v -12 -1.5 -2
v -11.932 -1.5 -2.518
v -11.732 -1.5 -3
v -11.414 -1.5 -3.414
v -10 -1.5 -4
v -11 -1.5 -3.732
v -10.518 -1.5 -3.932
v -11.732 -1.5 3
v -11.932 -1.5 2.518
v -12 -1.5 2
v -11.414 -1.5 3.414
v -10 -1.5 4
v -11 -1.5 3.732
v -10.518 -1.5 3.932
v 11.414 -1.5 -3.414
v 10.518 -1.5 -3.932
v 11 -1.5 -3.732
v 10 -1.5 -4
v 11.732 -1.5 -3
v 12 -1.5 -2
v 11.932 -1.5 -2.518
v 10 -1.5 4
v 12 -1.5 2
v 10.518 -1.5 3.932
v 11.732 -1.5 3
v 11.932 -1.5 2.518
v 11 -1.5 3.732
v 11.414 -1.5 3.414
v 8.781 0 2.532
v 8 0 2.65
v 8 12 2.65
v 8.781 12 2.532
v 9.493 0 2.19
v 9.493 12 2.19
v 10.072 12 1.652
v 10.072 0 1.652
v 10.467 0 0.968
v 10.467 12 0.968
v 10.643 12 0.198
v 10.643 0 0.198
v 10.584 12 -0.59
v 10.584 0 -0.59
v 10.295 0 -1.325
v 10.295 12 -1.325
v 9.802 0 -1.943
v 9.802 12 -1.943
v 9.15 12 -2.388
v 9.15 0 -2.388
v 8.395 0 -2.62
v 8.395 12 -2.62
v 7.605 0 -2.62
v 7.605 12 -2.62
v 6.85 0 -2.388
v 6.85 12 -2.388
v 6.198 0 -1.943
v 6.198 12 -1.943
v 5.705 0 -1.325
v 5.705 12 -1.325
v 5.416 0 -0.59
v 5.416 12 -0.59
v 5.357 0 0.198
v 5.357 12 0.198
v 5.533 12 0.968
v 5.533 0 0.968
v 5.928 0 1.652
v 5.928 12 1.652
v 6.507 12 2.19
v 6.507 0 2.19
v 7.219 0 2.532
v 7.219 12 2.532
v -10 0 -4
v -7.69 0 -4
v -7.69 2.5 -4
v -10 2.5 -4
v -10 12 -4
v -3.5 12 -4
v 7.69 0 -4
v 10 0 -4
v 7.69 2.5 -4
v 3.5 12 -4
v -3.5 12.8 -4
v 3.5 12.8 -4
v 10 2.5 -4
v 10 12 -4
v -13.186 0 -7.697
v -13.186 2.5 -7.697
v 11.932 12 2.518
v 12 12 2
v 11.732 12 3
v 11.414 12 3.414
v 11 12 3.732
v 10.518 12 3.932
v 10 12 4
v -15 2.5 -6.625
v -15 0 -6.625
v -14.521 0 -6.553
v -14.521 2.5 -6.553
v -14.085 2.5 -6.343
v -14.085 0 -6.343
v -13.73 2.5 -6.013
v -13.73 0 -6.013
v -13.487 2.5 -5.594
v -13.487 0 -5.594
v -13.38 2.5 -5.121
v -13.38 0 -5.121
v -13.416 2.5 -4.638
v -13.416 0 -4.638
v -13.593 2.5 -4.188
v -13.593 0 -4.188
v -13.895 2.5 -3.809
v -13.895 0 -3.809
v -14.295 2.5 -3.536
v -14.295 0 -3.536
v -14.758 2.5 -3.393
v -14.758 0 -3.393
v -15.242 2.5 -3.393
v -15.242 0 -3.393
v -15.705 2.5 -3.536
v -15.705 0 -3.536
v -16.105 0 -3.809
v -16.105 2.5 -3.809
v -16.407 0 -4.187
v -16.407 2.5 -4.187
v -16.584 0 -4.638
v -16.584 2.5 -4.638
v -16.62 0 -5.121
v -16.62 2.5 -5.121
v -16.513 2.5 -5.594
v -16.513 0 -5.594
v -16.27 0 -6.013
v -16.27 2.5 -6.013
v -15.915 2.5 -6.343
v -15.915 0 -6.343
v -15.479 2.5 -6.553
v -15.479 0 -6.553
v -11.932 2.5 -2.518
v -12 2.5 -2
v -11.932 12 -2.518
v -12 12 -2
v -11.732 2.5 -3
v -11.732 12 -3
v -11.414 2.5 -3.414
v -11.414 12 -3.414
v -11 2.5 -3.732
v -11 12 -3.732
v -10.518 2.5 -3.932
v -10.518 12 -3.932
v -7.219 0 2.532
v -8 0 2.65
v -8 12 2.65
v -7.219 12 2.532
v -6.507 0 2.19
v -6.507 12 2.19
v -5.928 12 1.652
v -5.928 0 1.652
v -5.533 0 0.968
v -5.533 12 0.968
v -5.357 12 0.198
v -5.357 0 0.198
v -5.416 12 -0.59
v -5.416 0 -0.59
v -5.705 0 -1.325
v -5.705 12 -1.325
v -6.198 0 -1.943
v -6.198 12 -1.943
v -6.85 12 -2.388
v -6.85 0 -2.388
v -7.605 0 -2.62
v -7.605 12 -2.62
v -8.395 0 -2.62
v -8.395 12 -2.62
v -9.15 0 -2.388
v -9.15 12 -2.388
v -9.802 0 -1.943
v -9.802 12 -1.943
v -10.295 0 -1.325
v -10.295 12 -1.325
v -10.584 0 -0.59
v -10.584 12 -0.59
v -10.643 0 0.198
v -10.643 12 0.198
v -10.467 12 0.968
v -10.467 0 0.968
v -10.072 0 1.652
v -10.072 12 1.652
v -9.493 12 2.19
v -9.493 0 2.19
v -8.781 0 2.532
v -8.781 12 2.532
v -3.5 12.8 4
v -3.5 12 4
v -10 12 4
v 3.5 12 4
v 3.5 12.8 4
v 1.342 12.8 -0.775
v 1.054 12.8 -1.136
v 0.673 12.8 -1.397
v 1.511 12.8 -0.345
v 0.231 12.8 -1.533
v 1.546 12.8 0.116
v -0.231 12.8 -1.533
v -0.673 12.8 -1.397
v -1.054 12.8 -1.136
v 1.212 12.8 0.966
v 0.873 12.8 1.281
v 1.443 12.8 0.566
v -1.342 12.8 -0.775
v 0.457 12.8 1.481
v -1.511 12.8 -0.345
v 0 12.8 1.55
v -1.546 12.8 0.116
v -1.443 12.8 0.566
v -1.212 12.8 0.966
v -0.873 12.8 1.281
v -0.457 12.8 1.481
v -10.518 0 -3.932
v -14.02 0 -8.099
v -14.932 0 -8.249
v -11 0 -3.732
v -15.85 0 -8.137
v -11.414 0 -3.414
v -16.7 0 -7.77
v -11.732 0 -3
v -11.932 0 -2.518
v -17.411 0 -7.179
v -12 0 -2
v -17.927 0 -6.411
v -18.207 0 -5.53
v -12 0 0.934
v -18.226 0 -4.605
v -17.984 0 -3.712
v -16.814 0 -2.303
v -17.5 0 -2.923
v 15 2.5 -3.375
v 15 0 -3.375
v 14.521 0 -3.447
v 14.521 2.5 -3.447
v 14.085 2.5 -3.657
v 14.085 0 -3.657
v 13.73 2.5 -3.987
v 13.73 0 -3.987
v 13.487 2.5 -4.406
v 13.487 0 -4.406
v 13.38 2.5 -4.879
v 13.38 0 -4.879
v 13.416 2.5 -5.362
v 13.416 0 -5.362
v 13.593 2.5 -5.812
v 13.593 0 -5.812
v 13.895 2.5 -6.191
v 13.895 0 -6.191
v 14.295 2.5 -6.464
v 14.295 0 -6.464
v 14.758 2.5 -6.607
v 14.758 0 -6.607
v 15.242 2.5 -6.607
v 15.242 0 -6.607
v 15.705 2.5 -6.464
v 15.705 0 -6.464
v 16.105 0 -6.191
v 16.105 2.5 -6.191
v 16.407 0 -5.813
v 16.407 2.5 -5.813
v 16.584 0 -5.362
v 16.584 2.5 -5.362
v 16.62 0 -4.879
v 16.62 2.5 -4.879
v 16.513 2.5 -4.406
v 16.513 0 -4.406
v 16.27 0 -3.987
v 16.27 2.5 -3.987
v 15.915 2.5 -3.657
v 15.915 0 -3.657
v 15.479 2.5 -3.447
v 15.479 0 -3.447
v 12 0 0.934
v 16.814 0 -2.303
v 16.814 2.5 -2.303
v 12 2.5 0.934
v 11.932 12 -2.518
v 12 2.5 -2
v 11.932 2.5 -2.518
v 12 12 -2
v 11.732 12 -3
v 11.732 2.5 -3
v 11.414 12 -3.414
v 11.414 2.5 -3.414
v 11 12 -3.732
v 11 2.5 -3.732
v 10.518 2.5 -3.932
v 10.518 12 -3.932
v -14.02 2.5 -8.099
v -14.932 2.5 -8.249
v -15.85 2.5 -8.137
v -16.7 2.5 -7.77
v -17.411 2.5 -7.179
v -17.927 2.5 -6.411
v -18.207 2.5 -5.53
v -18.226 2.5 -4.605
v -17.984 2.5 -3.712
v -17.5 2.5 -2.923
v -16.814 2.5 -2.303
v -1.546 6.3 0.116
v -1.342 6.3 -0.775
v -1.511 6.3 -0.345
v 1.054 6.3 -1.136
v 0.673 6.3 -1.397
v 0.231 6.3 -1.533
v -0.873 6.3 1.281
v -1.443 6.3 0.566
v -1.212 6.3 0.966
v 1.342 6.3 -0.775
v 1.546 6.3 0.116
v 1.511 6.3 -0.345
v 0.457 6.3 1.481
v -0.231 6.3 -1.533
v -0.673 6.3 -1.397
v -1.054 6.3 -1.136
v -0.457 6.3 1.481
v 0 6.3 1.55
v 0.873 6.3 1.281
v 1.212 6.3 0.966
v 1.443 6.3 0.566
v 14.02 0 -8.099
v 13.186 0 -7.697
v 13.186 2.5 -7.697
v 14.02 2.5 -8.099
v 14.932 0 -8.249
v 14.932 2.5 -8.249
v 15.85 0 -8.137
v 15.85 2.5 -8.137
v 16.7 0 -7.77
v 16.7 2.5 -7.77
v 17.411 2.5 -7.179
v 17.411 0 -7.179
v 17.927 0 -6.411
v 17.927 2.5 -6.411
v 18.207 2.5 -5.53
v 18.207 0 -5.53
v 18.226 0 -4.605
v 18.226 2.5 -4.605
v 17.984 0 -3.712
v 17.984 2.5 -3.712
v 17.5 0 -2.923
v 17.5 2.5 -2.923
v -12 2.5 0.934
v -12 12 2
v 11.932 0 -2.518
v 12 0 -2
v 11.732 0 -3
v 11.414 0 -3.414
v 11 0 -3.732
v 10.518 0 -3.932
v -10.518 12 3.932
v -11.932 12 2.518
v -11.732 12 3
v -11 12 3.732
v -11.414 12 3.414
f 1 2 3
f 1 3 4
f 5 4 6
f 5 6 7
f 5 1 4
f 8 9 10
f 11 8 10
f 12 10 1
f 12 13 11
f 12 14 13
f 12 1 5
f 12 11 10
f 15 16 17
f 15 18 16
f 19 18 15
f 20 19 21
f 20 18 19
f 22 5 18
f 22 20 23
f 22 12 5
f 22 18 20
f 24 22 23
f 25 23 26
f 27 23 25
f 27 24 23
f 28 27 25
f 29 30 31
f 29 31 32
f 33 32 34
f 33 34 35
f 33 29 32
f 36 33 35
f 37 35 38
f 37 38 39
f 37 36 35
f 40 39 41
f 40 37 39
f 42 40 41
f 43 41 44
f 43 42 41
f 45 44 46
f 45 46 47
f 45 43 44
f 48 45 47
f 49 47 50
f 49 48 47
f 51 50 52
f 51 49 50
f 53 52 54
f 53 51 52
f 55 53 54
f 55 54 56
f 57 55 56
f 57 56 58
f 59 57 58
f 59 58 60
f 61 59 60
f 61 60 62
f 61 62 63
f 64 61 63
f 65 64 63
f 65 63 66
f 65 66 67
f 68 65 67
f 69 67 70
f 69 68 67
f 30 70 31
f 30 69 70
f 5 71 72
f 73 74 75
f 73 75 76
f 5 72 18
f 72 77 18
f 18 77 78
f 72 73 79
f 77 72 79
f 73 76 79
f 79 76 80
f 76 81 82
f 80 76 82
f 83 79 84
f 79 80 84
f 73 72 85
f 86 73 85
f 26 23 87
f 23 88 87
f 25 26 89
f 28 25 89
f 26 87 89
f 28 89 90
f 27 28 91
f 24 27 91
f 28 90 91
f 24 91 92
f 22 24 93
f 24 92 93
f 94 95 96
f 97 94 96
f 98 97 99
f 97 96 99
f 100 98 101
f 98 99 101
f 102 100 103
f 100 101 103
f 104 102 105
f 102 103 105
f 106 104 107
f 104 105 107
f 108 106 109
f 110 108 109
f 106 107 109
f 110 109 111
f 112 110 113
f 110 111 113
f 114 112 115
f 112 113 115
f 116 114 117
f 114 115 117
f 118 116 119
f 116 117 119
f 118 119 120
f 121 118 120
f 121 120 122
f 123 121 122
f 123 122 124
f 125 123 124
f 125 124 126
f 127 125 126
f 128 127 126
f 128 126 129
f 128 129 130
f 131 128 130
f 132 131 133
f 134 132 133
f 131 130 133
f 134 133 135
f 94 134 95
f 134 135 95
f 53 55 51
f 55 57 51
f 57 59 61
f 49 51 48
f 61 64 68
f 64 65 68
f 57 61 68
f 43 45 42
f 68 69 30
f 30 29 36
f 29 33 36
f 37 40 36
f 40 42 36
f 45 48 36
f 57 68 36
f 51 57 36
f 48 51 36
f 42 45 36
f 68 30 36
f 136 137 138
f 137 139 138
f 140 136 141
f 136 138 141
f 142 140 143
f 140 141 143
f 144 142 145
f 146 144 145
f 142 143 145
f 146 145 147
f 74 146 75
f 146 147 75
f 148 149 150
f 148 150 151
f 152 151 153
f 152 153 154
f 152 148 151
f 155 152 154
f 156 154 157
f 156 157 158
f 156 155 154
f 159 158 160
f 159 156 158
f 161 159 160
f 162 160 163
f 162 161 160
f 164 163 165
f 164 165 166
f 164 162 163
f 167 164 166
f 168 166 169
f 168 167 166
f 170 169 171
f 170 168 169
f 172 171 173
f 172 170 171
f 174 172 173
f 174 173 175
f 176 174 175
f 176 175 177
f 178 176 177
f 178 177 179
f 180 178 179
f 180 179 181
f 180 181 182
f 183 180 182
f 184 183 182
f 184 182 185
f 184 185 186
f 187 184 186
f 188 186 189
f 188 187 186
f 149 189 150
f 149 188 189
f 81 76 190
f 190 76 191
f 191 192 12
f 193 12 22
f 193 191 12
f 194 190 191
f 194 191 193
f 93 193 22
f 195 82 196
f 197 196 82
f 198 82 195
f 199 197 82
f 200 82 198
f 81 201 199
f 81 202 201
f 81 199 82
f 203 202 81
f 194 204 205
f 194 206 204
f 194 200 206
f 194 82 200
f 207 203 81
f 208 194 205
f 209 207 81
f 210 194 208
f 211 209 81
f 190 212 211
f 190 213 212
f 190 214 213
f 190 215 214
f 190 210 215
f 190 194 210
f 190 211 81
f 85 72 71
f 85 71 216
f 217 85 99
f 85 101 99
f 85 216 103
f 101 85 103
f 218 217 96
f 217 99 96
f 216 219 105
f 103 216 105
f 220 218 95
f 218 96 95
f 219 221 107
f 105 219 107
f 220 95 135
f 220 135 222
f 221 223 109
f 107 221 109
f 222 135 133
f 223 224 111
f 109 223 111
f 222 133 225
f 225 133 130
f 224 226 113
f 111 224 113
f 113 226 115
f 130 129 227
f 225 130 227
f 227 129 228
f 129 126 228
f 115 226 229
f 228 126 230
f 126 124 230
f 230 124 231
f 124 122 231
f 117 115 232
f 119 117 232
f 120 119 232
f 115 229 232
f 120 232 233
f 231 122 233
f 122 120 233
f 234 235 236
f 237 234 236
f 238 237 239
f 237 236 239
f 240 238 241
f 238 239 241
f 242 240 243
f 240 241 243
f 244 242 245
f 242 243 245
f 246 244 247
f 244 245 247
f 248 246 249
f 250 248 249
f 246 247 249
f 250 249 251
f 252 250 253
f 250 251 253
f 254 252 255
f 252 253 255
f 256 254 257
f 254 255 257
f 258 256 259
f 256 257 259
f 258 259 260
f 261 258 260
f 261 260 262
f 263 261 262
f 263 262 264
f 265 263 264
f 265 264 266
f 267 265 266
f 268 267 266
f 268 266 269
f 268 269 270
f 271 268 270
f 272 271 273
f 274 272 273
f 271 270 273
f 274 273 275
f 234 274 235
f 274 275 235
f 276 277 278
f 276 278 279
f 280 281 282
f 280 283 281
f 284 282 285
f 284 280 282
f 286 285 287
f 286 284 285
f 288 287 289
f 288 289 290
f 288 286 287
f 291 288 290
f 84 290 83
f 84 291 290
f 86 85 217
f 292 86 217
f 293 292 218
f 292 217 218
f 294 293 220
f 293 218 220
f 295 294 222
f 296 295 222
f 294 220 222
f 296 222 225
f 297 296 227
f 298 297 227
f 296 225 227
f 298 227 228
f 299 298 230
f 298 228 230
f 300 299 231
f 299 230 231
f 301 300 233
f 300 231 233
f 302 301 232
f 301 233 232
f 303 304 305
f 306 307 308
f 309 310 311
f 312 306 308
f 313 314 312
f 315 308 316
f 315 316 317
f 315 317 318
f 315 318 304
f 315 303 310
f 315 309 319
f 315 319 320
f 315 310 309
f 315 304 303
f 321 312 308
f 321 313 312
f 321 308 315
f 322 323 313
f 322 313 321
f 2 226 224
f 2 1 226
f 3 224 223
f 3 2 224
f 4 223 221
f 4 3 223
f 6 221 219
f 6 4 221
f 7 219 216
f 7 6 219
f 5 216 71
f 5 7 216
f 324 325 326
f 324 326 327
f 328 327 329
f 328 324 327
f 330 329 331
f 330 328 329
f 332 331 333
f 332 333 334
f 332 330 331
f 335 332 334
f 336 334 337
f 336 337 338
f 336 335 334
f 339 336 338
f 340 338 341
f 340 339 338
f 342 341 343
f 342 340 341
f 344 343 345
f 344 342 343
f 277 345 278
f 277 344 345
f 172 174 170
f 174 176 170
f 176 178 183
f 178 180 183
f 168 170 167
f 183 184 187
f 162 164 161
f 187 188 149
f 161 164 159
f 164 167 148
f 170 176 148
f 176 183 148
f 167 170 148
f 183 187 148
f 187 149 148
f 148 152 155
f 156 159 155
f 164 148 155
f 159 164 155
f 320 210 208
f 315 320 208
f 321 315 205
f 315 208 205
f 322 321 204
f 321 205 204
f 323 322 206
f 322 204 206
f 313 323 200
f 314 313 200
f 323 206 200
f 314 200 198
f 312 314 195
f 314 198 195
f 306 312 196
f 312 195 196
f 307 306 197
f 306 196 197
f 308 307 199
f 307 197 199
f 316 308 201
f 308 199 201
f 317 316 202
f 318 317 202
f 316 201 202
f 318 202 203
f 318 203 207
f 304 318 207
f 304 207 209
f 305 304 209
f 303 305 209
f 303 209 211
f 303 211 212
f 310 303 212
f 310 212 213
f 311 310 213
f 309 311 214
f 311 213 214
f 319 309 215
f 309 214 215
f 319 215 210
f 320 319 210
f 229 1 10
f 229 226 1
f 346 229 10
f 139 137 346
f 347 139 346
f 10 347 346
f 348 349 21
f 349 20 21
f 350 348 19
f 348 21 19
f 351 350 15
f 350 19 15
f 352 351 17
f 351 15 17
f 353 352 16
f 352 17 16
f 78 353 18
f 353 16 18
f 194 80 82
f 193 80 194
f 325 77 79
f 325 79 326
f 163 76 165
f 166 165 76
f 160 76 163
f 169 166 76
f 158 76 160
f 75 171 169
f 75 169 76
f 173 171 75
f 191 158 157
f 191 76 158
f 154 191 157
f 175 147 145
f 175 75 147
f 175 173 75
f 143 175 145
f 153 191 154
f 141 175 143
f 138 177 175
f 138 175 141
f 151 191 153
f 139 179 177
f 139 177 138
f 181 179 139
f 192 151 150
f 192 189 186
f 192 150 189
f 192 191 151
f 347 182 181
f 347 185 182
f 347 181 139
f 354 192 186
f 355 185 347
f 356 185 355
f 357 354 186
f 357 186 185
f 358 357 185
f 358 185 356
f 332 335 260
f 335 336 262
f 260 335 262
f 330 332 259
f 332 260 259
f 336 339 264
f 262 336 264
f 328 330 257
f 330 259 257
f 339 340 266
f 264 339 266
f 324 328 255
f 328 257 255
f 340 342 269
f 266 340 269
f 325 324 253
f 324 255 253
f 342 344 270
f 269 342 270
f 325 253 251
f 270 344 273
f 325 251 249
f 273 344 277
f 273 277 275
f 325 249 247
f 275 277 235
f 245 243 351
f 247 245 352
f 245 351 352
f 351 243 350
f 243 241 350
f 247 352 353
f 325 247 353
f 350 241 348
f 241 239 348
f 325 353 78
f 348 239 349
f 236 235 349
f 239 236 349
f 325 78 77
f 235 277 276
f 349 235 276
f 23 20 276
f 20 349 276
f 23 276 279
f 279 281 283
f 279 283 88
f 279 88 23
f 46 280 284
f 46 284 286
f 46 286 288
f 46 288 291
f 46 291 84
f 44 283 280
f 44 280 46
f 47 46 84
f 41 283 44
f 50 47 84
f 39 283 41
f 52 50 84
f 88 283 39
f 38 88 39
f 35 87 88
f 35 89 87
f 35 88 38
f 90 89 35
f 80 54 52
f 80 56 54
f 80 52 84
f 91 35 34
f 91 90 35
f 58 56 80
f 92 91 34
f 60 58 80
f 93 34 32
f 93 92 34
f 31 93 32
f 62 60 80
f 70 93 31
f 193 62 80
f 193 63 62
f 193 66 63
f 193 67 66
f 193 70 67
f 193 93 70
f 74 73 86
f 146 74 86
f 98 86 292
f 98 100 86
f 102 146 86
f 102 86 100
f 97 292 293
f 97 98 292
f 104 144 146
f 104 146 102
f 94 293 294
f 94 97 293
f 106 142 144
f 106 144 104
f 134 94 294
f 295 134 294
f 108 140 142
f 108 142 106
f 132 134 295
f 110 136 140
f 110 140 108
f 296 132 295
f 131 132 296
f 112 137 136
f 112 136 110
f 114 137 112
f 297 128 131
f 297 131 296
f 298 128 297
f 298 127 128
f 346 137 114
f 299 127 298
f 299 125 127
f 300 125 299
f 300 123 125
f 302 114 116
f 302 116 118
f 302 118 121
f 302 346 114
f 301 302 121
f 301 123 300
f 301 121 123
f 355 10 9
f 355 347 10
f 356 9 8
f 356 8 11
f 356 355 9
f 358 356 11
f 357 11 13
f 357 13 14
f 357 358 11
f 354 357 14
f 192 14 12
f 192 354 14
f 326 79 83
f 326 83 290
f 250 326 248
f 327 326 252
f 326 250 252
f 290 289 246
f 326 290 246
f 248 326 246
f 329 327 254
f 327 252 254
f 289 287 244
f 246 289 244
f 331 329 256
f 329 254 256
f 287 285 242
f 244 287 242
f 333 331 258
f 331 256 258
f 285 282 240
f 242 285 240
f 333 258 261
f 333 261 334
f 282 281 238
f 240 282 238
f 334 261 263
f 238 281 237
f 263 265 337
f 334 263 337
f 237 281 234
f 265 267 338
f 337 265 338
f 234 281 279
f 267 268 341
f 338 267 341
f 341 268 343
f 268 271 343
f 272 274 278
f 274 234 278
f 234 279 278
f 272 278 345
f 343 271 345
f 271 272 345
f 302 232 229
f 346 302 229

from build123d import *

# Parameters (mm, degrees)
SKETCH25_W          = 7
SKETCH25_H          = 8
BOSS_EXTRUDE5_DEPTH = 12.8
SKETCH26_W          = 24
SKETCH26_H          = 8
SKETCH26_R          = 2.65
BOSS_EXTRUDE6_DEPTH = 12
SKETCH27_R          = 1.55
CUT_EXTRUDE1_DEPTH  = 6.5
SKETCH29_R          = 1.625
BOSS_EXTRUDE8_DEPTH = 2.5
SKETCH31_W          = 24
SKETCH31_H          = 8
BOSS_EXTRUDE9_DEPTH = 1.5
FILLET1_R           = 2


with BuildPart() as part:
    # Sketch25 → Boss-Extrude5 (new body)
    with BuildSketch(Plane(origin=(0, 0, 0), x_dir=(-1, 0, 0), z_dir=(0, 1, 0))):
        Rectangle(SKETCH25_W, SKETCH25_H)
    extrude(amount=BOSS_EXTRUDE5_DEPTH)

    # Sketch26 → Boss-Extrude6 (add)
    with BuildSketch(Plane(origin=(0, 0, 0), x_dir=(-1, 0, 0), z_dir=(0, 1, 0))):
        Rectangle(SKETCH26_W, SKETCH26_H)
        with Locations((-8, 0)):
            Circle(SKETCH26_R, mode=Mode.SUBTRACT)
        with Locations((8, 0)):
            Circle(SKETCH26_R, mode=Mode.SUBTRACT)
    extrude(amount=BOSS_EXTRUDE6_DEPTH)

    # Sketch27 → Cut-Extrude1 (cut)
    with BuildSketch(Plane(origin=(0, 12.8, 0), x_dir=(1, 0, 0), z_dir=(0, 1, 0))):
        Circle(SKETCH27_R)
    extrude(amount=-CUT_EXTRUDE1_DEPTH, mode=Mode.SUBTRACT)

    # Sketch29 → Boss-Extrude8 (add)
    # profile 1 of 2: a face of its own
    with BuildSketch(Plane.XZ):
        with BuildLine():
            Line((-16.813742475, -2.303179977), (-12, 0.934295686))
            Line((-12, 0.934295686), (-12, -4))
            Line((-12, -4), (-7.689524447, -4))
            Line((-7.689524447, -4), (-13.186257525, -7.696820023))
            ThreePointArc((-13.186257525, -7.696820023), (-17.696820023, -6.813742475), (-16.813742475, -2.303179977))
        make_face()
        with Locations((-15, -5)):
            Circle(SKETCH29_R, mode=Mode.SUBTRACT)
    # profile 2 of 2: a face of its own
    with BuildSketch(Plane.XZ):
        with BuildLine():
            Line((16.813742475, -2.303179977), (12, 0.934295686))
            Line((12, 0.934295686), (12, -4))
            Line((12, -4), (7.689524447, -4))
            Line((7.689524447, -4), (13.186257525, -7.696820023))
            ThreePointArc((13.186257525, -7.696820023), (17.696820023, -6.813742475), (16.813742475, -2.303179977))
        make_face()
        with Locations((15, -5)):
            Circle(SKETCH29_R, mode=Mode.SUBTRACT)
    extrude(amount=-BOSS_EXTRUDE8_DEPTH)

    # Sketch31 → Boss-Extrude9 (add)
    with BuildSketch(Plane.XZ):
        Rectangle(SKETCH31_W, SKETCH31_H)
    extrude(amount=BOSS_EXTRUDE9_DEPTH)

    # Fillet1
    fillet1_edges = [part.edges().sort_by_distance(p)[0] for p in [
        (-12, 5.25, 4),
        (12, 5.25, 4),
        (-12, -0.75, -4),
        (12, -0.75, -4),
        (-12, 7.25, -4),
        (12, 7.25, -4),
    ]]
    fillet(fillet1_edges, radius=FILLET1_R)


solid = part.part
